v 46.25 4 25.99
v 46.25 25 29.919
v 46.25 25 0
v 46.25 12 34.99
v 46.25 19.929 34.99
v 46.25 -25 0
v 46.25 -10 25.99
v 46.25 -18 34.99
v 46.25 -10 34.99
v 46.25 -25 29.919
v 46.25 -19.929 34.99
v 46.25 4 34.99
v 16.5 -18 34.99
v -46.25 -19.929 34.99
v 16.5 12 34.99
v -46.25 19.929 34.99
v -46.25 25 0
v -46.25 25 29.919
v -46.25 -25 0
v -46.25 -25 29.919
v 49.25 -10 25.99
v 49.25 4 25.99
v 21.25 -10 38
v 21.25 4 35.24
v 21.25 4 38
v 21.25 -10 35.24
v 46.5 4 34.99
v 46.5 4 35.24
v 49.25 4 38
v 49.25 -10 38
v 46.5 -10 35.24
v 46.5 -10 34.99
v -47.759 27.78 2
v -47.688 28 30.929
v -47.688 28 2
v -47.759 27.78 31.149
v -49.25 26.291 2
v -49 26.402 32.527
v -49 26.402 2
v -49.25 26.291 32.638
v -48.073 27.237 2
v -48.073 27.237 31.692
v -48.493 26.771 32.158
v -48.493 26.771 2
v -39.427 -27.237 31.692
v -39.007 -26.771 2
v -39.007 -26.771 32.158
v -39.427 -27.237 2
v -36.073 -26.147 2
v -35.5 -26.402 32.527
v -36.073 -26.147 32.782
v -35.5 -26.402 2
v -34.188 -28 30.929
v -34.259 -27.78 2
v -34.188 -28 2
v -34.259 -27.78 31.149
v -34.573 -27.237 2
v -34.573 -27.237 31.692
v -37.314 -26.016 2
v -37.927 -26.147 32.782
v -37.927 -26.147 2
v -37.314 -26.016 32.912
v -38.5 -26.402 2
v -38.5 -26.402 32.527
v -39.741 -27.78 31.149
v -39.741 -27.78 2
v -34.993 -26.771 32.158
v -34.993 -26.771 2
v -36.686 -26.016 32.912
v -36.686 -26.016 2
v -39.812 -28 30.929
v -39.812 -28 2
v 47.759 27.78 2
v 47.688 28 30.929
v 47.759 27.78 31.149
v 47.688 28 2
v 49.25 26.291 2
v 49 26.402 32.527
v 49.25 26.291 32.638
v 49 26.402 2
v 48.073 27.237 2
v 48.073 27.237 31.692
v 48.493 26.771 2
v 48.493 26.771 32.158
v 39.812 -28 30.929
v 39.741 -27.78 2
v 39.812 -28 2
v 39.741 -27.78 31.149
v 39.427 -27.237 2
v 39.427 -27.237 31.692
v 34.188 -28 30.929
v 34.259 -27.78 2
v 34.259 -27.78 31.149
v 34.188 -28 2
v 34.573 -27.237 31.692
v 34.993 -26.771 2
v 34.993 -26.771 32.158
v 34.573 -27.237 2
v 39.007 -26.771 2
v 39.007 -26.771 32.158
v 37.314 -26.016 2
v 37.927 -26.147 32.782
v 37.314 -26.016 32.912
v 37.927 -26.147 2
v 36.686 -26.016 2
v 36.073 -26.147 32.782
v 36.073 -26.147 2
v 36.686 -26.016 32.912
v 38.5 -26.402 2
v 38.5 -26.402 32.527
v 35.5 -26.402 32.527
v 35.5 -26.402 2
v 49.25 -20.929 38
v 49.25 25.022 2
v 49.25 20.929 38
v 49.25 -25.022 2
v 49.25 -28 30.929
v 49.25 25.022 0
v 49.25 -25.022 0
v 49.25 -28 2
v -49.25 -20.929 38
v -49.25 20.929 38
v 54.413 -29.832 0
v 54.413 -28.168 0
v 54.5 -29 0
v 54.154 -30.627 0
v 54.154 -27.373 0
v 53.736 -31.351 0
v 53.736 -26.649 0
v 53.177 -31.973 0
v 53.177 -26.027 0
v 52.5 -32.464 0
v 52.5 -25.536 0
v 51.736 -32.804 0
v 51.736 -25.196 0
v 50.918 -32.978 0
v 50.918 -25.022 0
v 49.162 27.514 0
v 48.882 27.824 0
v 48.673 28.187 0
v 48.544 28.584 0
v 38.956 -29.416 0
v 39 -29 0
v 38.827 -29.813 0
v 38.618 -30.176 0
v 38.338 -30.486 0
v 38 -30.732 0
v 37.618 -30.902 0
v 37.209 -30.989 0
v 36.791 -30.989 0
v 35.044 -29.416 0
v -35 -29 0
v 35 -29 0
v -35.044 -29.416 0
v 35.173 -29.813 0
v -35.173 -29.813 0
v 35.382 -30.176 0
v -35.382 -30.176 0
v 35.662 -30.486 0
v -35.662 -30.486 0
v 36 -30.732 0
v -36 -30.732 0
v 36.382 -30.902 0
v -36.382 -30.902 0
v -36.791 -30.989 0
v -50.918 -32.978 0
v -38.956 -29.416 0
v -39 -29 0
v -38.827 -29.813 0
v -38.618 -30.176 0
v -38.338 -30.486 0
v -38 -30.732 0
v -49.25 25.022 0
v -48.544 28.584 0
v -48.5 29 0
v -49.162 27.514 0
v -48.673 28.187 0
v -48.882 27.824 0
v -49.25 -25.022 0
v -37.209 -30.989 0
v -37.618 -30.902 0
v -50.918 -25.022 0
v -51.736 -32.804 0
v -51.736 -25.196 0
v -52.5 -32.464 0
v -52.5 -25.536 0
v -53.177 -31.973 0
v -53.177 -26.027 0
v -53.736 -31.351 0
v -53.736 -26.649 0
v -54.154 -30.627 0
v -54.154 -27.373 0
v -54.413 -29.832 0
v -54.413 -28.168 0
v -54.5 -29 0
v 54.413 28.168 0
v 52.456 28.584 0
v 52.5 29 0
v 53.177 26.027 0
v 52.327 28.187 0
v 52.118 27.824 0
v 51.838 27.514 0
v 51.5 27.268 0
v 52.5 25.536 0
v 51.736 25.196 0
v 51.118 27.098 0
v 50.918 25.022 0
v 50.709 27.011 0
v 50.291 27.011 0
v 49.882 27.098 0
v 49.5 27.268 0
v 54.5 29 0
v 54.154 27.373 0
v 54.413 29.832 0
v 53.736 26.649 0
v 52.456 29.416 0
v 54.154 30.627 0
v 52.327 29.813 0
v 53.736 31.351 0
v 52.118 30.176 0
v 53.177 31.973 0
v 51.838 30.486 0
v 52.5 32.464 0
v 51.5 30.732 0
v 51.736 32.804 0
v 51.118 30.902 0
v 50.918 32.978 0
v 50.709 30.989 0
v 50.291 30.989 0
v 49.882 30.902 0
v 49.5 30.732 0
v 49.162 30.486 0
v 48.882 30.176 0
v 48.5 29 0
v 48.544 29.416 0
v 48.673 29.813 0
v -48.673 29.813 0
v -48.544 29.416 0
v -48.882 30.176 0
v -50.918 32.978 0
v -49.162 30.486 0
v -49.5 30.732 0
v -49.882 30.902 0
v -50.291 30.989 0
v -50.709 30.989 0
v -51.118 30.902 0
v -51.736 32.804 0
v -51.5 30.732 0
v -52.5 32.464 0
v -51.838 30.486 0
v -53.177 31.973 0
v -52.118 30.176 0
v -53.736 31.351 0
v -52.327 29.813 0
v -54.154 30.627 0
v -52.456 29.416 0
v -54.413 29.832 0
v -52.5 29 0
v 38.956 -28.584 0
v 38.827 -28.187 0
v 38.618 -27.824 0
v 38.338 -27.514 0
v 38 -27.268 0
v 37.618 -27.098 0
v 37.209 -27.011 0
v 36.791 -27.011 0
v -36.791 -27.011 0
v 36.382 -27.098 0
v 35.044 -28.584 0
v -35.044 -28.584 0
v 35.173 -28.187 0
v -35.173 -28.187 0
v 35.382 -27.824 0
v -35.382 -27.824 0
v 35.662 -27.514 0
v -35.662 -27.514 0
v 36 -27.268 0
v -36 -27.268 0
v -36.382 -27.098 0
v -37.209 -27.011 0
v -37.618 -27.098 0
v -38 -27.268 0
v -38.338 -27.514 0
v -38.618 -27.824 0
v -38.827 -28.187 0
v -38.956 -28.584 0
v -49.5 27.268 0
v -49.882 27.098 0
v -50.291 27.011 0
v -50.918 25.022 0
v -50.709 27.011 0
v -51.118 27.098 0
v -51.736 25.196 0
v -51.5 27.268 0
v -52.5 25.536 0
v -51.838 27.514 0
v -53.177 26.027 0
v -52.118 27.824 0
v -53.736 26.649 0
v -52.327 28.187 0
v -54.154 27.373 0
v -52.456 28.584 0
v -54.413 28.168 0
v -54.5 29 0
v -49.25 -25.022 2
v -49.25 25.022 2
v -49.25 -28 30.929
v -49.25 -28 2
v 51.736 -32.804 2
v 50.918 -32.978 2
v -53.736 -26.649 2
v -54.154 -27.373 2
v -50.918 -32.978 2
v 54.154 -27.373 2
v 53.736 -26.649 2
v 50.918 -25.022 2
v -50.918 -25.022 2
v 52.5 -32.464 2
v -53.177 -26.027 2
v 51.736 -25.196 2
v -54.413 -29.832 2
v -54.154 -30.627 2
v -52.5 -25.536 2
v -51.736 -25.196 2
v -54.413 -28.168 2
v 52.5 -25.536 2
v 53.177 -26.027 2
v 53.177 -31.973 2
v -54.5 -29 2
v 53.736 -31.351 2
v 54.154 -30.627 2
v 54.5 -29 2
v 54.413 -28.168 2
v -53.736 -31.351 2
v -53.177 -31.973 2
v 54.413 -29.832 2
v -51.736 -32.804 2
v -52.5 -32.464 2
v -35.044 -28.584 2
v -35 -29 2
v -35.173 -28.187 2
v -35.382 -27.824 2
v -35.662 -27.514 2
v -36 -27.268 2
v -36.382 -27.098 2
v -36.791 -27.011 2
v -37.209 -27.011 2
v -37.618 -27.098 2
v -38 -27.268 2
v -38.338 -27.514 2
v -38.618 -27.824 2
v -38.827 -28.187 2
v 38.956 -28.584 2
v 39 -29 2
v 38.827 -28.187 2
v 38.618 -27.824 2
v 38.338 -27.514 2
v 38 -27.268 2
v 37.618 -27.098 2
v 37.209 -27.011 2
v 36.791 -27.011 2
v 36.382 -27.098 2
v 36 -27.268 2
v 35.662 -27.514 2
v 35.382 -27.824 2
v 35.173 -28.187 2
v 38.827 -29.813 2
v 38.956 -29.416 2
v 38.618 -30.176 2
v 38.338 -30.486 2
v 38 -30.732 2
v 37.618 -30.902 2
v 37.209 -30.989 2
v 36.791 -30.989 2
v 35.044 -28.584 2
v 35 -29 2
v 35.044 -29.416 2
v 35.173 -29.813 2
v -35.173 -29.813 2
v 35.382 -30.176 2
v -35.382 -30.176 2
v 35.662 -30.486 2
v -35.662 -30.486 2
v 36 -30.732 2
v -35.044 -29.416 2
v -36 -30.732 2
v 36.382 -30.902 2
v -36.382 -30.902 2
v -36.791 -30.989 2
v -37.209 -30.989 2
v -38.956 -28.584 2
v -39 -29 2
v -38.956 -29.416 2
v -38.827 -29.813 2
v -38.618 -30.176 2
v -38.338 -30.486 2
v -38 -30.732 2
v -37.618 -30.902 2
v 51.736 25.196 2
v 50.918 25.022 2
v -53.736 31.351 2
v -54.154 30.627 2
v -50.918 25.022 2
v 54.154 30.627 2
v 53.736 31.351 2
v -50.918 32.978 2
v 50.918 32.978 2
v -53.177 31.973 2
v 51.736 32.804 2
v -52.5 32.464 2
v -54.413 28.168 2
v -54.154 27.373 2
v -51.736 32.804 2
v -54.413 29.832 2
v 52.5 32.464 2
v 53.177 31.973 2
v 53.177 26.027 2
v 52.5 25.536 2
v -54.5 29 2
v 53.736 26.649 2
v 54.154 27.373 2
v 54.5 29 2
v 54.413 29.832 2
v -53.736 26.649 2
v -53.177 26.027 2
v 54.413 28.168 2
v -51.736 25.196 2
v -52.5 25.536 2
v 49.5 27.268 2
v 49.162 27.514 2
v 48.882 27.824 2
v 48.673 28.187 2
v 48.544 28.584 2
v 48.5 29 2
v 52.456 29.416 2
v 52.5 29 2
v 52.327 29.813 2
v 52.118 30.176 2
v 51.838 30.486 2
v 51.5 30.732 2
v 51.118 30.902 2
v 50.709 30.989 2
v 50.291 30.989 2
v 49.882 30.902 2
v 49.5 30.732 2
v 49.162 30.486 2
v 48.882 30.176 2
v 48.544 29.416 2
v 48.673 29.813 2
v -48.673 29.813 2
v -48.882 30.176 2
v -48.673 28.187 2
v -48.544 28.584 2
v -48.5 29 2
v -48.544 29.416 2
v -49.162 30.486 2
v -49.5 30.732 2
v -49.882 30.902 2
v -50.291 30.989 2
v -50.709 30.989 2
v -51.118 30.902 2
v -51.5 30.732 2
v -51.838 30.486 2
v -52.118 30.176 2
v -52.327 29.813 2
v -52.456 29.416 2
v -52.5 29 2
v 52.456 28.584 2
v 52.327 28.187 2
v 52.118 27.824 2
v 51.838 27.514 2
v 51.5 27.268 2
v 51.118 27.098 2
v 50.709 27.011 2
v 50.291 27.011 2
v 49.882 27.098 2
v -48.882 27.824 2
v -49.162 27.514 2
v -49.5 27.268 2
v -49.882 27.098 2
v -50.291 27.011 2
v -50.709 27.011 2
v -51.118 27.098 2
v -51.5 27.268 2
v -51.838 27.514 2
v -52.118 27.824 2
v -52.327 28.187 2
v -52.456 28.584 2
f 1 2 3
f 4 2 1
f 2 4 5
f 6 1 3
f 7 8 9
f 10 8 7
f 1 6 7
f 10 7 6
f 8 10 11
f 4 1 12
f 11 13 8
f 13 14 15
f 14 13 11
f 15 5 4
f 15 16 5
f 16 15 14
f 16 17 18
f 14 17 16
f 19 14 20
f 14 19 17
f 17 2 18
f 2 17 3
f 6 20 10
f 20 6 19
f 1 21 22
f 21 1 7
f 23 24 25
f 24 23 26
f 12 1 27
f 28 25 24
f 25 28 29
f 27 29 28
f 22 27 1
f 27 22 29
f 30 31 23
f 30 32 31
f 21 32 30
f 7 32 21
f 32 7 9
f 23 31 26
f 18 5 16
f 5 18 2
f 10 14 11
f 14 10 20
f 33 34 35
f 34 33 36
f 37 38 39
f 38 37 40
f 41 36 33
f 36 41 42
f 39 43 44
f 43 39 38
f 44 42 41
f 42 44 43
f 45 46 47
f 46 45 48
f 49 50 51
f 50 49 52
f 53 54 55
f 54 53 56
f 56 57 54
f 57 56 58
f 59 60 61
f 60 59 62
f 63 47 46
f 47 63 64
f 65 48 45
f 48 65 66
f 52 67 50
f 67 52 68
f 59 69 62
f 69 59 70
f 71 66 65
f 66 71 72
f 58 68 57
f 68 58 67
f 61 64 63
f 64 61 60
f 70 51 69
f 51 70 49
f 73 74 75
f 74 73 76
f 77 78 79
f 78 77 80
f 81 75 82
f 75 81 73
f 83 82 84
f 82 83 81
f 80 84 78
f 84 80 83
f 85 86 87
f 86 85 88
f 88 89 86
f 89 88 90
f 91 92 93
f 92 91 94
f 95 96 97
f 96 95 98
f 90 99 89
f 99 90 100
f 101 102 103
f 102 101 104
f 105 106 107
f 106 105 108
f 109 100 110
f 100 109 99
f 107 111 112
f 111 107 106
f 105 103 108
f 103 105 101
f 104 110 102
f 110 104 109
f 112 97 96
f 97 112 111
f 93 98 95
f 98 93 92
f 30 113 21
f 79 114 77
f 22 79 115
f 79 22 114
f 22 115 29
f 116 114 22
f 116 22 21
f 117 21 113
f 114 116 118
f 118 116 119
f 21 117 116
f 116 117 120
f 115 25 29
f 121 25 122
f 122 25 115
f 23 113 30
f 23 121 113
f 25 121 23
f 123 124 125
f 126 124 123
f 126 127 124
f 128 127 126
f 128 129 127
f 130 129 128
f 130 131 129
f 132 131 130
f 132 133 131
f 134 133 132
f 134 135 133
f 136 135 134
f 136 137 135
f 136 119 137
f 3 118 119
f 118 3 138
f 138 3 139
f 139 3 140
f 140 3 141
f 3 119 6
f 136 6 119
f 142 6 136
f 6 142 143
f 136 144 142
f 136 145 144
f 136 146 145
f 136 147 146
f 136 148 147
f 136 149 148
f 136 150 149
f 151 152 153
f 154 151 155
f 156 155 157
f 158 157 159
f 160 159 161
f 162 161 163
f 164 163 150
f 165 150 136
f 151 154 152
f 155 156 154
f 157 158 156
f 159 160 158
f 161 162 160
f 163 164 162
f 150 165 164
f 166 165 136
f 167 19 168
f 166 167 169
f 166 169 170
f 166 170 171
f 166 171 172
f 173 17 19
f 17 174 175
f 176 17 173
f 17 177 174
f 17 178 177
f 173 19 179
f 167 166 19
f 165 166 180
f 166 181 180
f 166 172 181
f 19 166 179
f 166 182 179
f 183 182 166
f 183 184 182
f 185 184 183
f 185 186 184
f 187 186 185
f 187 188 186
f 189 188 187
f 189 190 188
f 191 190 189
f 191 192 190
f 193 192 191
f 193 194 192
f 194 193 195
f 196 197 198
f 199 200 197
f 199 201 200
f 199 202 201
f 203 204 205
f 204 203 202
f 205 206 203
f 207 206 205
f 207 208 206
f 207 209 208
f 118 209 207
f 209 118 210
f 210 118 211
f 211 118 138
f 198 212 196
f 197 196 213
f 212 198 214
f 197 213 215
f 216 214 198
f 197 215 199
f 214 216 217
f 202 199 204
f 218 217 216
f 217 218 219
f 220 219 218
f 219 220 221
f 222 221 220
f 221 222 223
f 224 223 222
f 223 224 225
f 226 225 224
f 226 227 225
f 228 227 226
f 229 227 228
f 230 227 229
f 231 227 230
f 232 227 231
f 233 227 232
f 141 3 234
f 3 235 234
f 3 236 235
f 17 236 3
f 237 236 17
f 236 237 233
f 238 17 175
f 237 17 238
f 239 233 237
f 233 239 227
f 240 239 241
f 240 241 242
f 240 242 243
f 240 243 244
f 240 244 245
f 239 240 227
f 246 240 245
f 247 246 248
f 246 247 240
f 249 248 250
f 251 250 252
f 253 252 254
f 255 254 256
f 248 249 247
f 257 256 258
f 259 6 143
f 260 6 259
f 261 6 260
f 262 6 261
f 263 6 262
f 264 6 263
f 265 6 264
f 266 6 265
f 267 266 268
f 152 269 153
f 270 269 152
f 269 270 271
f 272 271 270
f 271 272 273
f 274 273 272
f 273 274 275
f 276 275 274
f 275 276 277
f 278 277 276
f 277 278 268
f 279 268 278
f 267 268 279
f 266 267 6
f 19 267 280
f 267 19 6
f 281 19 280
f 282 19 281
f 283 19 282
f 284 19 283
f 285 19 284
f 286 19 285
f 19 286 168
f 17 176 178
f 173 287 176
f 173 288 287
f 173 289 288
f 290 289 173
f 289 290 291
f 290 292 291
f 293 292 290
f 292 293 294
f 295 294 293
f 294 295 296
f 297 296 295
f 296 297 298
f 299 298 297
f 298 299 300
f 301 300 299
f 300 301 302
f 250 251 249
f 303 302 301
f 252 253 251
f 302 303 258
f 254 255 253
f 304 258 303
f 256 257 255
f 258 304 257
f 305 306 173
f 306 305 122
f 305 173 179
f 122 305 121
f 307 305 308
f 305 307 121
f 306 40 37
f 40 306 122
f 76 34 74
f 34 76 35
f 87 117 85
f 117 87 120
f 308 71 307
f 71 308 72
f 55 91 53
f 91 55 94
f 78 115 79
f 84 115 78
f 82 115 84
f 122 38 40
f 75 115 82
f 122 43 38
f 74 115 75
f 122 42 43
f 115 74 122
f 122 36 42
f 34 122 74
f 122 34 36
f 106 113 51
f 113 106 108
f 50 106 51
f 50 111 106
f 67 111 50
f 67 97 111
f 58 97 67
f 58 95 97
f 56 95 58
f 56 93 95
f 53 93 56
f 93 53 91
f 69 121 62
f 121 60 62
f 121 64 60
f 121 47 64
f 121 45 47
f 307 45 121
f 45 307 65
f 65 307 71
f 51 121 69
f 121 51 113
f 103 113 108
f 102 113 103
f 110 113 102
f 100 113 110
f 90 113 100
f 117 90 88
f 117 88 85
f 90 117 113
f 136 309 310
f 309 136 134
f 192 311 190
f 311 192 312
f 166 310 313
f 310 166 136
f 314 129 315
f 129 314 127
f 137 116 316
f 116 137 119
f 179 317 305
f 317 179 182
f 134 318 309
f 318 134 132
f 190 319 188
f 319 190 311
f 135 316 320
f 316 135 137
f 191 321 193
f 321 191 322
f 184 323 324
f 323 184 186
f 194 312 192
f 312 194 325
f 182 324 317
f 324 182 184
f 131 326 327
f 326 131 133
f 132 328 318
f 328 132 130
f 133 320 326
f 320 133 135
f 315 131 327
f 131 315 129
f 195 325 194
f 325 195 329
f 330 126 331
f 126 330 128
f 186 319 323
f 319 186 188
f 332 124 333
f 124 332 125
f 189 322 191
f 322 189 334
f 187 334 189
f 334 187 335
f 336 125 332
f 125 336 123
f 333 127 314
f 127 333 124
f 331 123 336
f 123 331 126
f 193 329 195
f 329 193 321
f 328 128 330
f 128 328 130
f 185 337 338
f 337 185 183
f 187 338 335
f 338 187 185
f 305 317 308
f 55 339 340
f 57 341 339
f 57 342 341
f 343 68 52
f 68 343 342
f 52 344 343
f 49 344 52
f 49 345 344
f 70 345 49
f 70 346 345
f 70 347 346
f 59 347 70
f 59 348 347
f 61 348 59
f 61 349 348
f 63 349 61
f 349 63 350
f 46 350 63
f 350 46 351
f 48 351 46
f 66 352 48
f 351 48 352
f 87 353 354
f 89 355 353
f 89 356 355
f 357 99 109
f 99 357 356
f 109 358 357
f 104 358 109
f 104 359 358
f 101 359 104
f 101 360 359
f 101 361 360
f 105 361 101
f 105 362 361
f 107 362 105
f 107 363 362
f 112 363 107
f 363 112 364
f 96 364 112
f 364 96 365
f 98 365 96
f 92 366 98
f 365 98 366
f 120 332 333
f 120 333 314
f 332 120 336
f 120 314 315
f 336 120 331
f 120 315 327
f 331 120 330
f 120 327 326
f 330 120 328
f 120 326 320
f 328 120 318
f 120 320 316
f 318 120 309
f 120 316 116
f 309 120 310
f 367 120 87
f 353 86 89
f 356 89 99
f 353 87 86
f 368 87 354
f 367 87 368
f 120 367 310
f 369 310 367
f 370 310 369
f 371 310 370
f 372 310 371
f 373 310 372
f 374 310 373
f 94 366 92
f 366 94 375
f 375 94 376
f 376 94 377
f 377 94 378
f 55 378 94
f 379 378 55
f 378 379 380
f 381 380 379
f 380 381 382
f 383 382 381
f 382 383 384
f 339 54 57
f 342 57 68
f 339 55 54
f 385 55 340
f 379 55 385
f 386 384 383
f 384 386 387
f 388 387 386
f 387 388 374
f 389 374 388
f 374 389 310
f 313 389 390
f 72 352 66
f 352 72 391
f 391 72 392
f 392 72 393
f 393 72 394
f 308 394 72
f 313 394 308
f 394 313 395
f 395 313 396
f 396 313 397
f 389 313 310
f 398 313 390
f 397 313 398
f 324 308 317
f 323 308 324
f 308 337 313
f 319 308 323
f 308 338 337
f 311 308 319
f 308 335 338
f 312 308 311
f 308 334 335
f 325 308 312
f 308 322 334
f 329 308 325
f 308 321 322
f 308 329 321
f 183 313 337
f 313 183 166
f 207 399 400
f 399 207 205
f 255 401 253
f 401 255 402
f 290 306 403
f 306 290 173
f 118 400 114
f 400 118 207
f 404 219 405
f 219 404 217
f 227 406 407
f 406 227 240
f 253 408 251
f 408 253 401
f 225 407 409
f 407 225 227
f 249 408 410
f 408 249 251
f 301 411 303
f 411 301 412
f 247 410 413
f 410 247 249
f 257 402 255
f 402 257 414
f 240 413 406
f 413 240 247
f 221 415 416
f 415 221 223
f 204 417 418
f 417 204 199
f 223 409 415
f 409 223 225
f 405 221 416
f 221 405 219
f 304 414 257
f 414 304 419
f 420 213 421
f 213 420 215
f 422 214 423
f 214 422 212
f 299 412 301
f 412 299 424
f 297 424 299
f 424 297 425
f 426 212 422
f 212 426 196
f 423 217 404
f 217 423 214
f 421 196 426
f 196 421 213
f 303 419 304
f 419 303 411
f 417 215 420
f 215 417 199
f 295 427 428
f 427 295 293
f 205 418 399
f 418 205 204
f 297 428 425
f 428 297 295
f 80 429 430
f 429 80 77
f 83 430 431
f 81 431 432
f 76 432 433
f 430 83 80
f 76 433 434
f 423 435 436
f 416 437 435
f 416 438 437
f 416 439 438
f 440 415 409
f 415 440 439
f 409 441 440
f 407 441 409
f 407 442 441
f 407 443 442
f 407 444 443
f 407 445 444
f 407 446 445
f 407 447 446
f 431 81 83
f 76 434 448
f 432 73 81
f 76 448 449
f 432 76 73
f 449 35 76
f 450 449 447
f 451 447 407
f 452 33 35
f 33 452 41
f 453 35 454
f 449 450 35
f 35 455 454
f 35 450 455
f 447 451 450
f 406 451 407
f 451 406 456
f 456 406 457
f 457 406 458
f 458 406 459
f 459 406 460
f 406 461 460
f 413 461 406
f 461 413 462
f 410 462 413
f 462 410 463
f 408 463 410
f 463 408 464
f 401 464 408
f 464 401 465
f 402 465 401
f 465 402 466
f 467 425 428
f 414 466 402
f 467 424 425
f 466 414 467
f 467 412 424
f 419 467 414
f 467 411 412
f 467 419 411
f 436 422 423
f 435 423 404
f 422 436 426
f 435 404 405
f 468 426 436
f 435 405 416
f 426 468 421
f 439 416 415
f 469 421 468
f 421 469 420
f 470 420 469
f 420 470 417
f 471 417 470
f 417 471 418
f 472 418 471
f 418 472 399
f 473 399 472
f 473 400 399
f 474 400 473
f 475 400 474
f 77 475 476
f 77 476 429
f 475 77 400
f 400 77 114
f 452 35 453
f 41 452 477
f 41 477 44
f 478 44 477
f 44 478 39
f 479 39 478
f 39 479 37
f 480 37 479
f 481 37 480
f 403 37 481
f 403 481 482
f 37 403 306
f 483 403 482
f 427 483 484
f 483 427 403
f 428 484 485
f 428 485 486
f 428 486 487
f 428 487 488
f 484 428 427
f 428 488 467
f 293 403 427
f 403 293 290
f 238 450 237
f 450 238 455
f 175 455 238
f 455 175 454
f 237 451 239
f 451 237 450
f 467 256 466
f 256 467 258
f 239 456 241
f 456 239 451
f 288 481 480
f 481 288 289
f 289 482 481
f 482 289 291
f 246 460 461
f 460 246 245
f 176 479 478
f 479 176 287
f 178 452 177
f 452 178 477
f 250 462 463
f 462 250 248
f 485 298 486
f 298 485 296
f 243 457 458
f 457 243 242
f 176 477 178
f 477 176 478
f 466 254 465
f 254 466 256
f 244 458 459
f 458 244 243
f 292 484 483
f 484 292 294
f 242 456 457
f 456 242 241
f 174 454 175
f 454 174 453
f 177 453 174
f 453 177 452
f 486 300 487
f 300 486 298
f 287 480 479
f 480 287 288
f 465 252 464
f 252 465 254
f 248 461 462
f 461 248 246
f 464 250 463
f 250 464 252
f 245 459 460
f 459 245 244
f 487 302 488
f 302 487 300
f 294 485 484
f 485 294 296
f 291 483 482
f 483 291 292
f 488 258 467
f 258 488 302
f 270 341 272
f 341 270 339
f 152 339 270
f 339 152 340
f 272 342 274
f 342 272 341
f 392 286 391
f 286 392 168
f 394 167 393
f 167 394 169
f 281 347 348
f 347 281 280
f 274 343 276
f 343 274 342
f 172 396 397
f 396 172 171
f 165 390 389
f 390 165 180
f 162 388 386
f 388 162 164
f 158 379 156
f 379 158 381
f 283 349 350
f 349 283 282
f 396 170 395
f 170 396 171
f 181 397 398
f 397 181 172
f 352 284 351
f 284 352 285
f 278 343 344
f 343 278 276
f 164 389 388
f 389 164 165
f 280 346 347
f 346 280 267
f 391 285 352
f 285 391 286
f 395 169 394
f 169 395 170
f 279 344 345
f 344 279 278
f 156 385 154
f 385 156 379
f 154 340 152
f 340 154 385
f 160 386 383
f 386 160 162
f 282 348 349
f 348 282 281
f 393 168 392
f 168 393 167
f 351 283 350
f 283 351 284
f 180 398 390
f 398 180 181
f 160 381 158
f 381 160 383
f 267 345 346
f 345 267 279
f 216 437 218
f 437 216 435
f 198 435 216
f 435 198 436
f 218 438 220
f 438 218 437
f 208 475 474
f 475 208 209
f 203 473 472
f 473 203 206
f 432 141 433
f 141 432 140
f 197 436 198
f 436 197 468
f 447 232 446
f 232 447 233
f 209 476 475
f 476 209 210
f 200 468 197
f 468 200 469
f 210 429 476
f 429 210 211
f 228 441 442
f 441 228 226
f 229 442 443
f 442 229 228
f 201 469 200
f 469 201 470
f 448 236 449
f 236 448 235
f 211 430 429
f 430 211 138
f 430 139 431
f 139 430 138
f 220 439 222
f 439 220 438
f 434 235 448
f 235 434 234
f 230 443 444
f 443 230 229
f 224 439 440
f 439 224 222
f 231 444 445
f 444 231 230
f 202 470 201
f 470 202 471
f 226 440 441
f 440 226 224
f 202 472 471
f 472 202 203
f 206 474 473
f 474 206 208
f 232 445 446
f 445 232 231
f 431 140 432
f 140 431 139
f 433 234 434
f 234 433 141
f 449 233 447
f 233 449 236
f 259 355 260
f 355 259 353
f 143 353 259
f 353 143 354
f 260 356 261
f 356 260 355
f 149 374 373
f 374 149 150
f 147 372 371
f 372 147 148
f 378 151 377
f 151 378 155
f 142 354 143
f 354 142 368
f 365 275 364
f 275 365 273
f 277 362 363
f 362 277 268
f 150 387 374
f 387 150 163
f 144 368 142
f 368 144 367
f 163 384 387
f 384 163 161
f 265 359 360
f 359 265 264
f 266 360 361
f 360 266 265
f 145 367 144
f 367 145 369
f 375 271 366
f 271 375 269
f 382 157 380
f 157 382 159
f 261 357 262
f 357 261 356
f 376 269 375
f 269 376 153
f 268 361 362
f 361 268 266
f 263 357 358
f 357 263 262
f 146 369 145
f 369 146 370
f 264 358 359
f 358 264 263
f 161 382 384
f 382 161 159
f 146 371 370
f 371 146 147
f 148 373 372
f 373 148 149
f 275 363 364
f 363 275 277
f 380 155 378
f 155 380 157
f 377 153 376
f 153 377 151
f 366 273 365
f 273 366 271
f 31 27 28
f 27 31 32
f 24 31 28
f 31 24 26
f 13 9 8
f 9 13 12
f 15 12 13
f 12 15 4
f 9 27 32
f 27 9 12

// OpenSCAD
$fn = 30;

bx = 6.18;
by = 6.18;
bz = 3.5;
bgap = 3.75;
btab = 1.2; // height of button above body
wall = 4;
bezel = 3;
flangez = 1;
bheight = 2;
grid = 2.54;
pcbthk = 1.6;

braceheight = 5; // calculated to 4.7, but needs verification

rowx = bx+bgap+wall*2+4;
rowy = 4*(by+bgap)+2*grid+4;
row3y = 3*(by+bgap)+4;
echo(rowx);
echo(rowy);

*button_housing();
*row();
*for (i=[-1, 1, 0], j=[-1, 1])
    translate([i*15, j*10, 0])
        button_pad();
*xypad(); 

*xyback();
*zpad();
*row3();
*zpad2();
*zpad3();
*z3back();

*z2back();
*resetpad();

*xbutton_pad();
*translate([0, -10, 0]) ybutton_pad();
*translate([0, -20, 0]) zbutton_pad();

*resetback();

*translate([-13, 18, -40])
fullback();
*resettunnel();
*translate([-70, 0, 0])ztunnel();
*backbox();
*lid();
*backplate();
backbox2();

module backbox2() {
    union() {
        translate([0, 0, 38/2])
        difference() {
            union() {
                cube([98.5, 56, 38], true);
            }
            translate([0, 56/2, 38/2])
                rotate([45, 0, 0])
                    cube([200, 10, 40], true);
             translate([0, -56/2, 38/2])
                rotate([-45, 0, 0])
                    cube([200, 10, 40], true);
            
            translate([0, 0, -1.51])
                backboxvoid();
            
            for (i=[-1, 1]) {
                translate([i*101/2, 29, 0])
                    cylinder(r=3, h=200, center=true);
                translate([i*37, -29, 0])
                    cylinder(r=3, h=200, center=true);
            }

            
         }
         mounttabs();
         translate([31.5, -3, 35.115])
            color("red") cube([30, 30, 0.25], true);
     }
}

module mounttabs() {
    translate([0, 0, 1])
    difference() {
        for(i=[-1, 1]) {
            translate([0, i*58/2, 0])
                hull() {
                    for (j=[-1, 1])
                        translate([j*101/2, 0, 0])
                            cylinder(r=4, h=2, center=true);
                }
        }
        for (i=[-1, 1]) {
            translate([i*101/2, 29, 0])
                cylinder(r=2, h=20, center=true);
            translate([i*37, -29, 0])
                cylinder(r=2, h=20, center=true);
        }
    }
}

module backboxvoid() {
    difference() {
        union() {
            cube([92.5, 50, 35], true);
            translate([92.5/2-26/2+3, -50/2+14/2+15, 35/2-10/2+3])
                cube([30, 14, 14], true);
        }
        translate([0, 50/2+1, 35/2+1])
            rotate([45, 0, 0])
                cube([200, 10, 40], true);
         translate([0, -50/2-1, 35/2+1])
            rotate([-45, 0, 0])
                cube([200, 10, 40], true);
    }
}

module lid() {
    mirror([0, 0, 0])
     union() {
        difference() {
            union() {
                hull() for(i=[-1, 1], j=[-1, 1])
                    translate([i*(93/2+4), j*(50/2+4), 0])
                        cylinder(r=4, h=8, center=true);
               translate([-13, 18, 0])
                    cylinder(r=30, h=8, center=true);
            }
            translate([0, 0, 2])
                cube([93, 50, 8], true);
            translate([-13, 18, 2]) 
                cylinder(r=27, h=8, center=true);
            
   
            translate([93/2, -(50/2+4)-4+2.5+37, 8/2-4/2])
                cube([20, 5, 4.01], true);
             
             
            for(i=[-1, 1], j=[-1, 1])
                translate([i*(93/2+4), j*(50/2+4), 0])
                    cylinder(r=2, h=10, center=true);

         }
     }
}

module backplate() {
    mirror([0, 1, 0])
     union() {
        difference() {
            union() {
                hull() for(i=[-1, 1], j=[-1, 1])
                    translate([i*(93/2+4), j*(50/2+4), 0])
                        cylinder(r=4, h=5, center=true);
                translate([46, 0, 0])
                    hull() for (i=[-1, 1])
                        translate([0, i*15-30, 0])
                            cylinder(r=8, h=5, center=true);
                translate([-50, -20, 0])
                    cylinder(r=15, h=5, center=true);
                translate([-13, 18, 0])
                    cylinder(r=30, h=5, center=true);
            }
            translate([0, 0, 2])
                cube([93, 50, 5], true);
            translate([46, 0, 0])
                hull() for (i=[-1, 1])
                    translate([0, i*15-30, -1.9])
                        cylinder(r=6, h=5, center=true);
            translate([-50, -20, -1.9])
                cylinder(r=13, h=5, center=true);
            translate([-13, 18, 2]) {
                cylinder(r=8, h=50, center=true);
                for(i=[-1, 1], j=[-1, 1])
                    translate([i*15, j*15, 0]) {
                        cylinder(r=1.9, h=50, center=true);
                    }
                for(i=[-1, 1])
                    translate([i*15, 15, 0]) {
                        cylinder(r=3.4, h=5, center=true);
                    }
            }
             
             
             
            for(i=[-1, 1])
                translate([i*(93/2+4), (50/2+4), 0]) {
                   translate([0, 0, 3.25])
                        cylinder(r=1.9, h=5, center=true);
                   translate([0, 0, -2])
                        cylinder(r=3.2, h=5, center=true, $fn=6);
                }
                
            for(i=[-1, 1])
                translate([i*(60/2+4), -(50/2+4), 0]) {
                   translate([0, 0, 3.25])
                        cylinder(r=1.9, h=5, center=true);
                   translate([0, 0, -2])
                        cylinder(r=3.2, h=5, center=true, $fn=6);
                }

         }
         translate([41.5, 14.75, 1.5])
            difference() {
                cylinder(r=4, h=8, center=true);
                cylinder(r=2.6, h=11, center=true);
            }
         translate([-37.5, -14., 1.5])
            difference() {
                cylinder(r=4, h=8, center=true);
                translate([0, 0, 2])
                    cylinder(r=2.6, h=10, center=true);
            }
     }
}

module backbox() {
    mirror([0, 1, 0])
     union() {
        difference() {
            union() {
                hull() for(i=[-1, 1], j=[-1, 1])
                    translate([i*(93/2+4), j*(50/2+4), 0])
                        cylinder(r=4, h=40, center=true);
                translate([46, 0, 0])
                    hull() for (i=[-1, 1])
                        translate([0, i*15-30, -40/2+10/2])
                            cylinder(r=8, h=10, center=true);
                translate([-50, -20, -40/2+10/2])
                    cylinder(r=15, h=10, center=true);
                translate([-13, 18, 0])
                    cylinder(r=30, h=40, center=true);
            }
            translate([0, 0, 2])
                cube([93, 50, 40], true);
            translate([46, 0, 0])
                hull() for (i=[-1, 1])
                    translate([0, i*15-30, -40/2+10/2-2])
                        cylinder(r=6, h=10, center=true);
            translate([-50, -20, -40/2+10/2-2])
                cylinder(r=13, h=10, center=true);
            translate([-13, 18, 2]) {
                cylinder(r=27, h=40, center=true);
                cylinder(r=8, h=50, center=true);
                for(i=[-1, 1], j=[-1, 1])
                    translate([i*15, j*15, 0]) {
                        cylinder(r=1.9, h=50, center=true);
                    }
            }
             
             
             
            for(i=[-1, 1], j=[-1, 1])
                translate([i*(93/2+4), j*(50/2+4), 40/2-5+0.01])
                    cylinder(r=2.6, h=10, center=true);

         }
         translate([41.5, 14.75, -40/2+10/2])
            difference() {
                cylinder(r=4, h=10, center=true);
                cylinder(r=2.6, h=11, center=true);
            }
         translate([-37.5, -14., -40/2+10/2])
            difference() {
                cylinder(r=4, h=10, center=true);
                translate([0, 0, 2])
                    cylinder(r=2.6, h=10, center=true);
            }
     }
}

module resettunnel() {
    translate([-38, -38, 0]) {
        difference() {
            union() {
                translate([0, 0, -4])
                    cylinder(r=14, h=2, center=true);
                cylinder(r=8, h=10, center=true);
                translate([0, 15, 0])
                    cube([16, 30, 10], true);
            }
            translate([0, 0, -1])
                cylinder(r=5, h=8.01, center=true);
            translate([0, 15, -1])
                cube([10.02, 30.01, 8.01], true);
            rotate([0, 0, -17.7]) {
                translate([0, -10, 0]) {
                    translate([0, 0, 2])
                        cylinder(r=3, center=true, h=10);
                    cylinder(r=2, center=true, h=30);
                }
            }
        }
    }

}

module ztunnel() {
    translate([58.5, -45-17, 0]) {
        difference() {
            union() {
                cylinder(r=8, h=10, center=true);
                translate([0, 27, 0])
                    cube([16, 54, 10], true);
            }
            translate([0, 33, -1])
                cube([10, 54.01, 8.01], true);
            cylinder(r=2, h=20, center=true);
            translate([0, 0, 6])
                cylinder(r=4, h=10, center=true);
        }
    }

}

module fullback() {
    union() {
        xyback();
        translate([-38, -38, 0])
            resetback();
        translate([-41, -20, 1.5])
            rotate([0, 0, 72.3])
                cube([10, 50, 3], true);
        translate([-20, -40, 1.5])
            rotate([0, 0, 17.7])
                cube([10, 50, 3], true);
        translate([58.5, -45, 0])
            z3back();
        translate([52, -20, 1.5])
           rotate([0, 0, -72.3])
            cube([10, 35, 3], true);
    }
}

module body() {
    difference() {
       linear_extrude(height = 15) scale([1.1, 1.1, 1])
            import (file = "xypad.dxf");
       translate([0, 0, bezel])
            linear_extrude(height = 15-bezel) scale([0.9, 0.9, 1])
            import (file = "xypad.dxf");
    }
}

module xyback() {
    difference() {
        union() {
            linear_extrude(height = 5) scale([1.1, 1.1, 1])
                import (file = "xypad.dxf");
            for(i=[0, 1, 2, 3])
                rotate([0, 0, i*90])
                    translate([0, (rowx+rowy)/2, braceheight/2+5])
                        for(j=[-1, 1])
                            translate([j*(bx+bgap+wall)/2, 0, 0])
                                cube([wall-1, rowy, braceheight], true);
        }
        cylinder(r=8, h=12, center=true);
        
        for(i=[-1, 1], j=[-1, 1])
            translate([i*15, j*15, 0]) {
                cylinder(r=1.9, h=10, center=true);
                translate([0, 0, 2])
                    cylinder(r=3.2, h=4, $fn=6);
            }
            
        for(i=[-1, 1]) {
            translate([i*(rowy+rowx), 0, 0])
                cylinder(r=2, h=15, center=true);
            translate([0, i*(rowy+rowx), 0])
                cylinder(r=2, h=15, center=true);
        }

    }
}
    
module xypad() {
    union() {
        difference() {
            body();
            for(i=[0, 1, 2, 3])
                rotate([0, 0, i*90])
                    translate([0, rowy/2+bx+bgap, 0])
                        cube([rowx, rowy, bezel*3], true);;
            for(i=[-1, 1]) {
                translate([i*(rowy+rowx), 0, bezel])
                    cylinder(r=2.6, h=15);
                translate([0, i*(rowy+rowx), bezel])
                    cylinder(r=2.6, h=15);
            }
       }
        for(i=[0, 1, 2, 3])
            rotate([0, 0, i*90])
                translate([0, bx+bgap, 0])
                    row();
    }
    
}

module zpad() {
    union() {
        difference() {
            hull() {
                for (i=[-1, 1])
                    translate([0, i*(row3y-rowx+rowx/2+20)/2, 0])
                        cylinder(r=rowx/2+2, h=15);
            }
            translate([0, 0, 15/2+bezel])
                cube([rowx-4, row3y, 15], true);
            translate([0, 0, 0])
                cube([bx+bgap, row3y, 15], true);
            for (i=[-1, 1]) {
                translate([0, i*(row3y-rowx+rowx/2+20)/2, bezel])
                    cylinder(r=2.6, h=20);
           }
         }
        row3();
    }
}

module zpad2() {
    union() {
        difference() {
            hull() {
                for (i=[-1, 1])
                    translate([0, i*(row3y*2-rowx+rowx/2+24)/2, 0])
                        cylinder(r=rowx/2+2, h=15);
            }
            for (i=[-1, 1]) {
                translate([0, i*(row3y/2+2), 15/2+bezel])
                    cube([rowx-4, row3y, 15], true);
                translate([0, i*(row3y/2+2), 0])
                    cube([bx+bgap, row3y, 15], true);
            }
            for (i=[-1, 1]) {
                translate([0, i*(row3y*2-rowx+rowx/2+24)/2, bezel])
                    cylinder(r=2.6, h=20);
           }
         }
         for (i=[-1, 1])
             translate([0, i*(row3y/2+2), 0])
                 if (i == -1) {
                     rotate([0, 0, 180])
                        row3();
                 }
                 else {
                     row3();
                 }
    }
}

module zpad3() {
    mirror([1, 0,0])
    union() {
        //translate([0, 30, 0]) rotate([0, 0, 17.7]) cube([100, 4, 4], true);
        difference() {
            hull() {
                for (i=[-1, 1], j=[-1, 1])
                    translate([j*rowx, i*row3y/2+j*7, 0])
                        cylinder(r=10, h=15);
            }
            translate([0, 0, 5+bz+btab+bezel+flangez+pcbthk]) cube([30, row3y, 10], true);
            for (i=[-1, 1]) {
                translate([i*(rowx/2+2), i*4, 15/2+bezel])
                    cube([rowx-4, row3y, 15], true);
                translate([i*(rowx/2+2), i*4, 0])
                    cube([bx+bgap, row3y, 15], true);
            }
            translate([rowx, row3y/2+7, bezel])
                cylinder(r=2.6, h=20);
            translate([-rowx, -(row3y/2+7), bezel])
                cylinder(r=2.6, h=20);
    
         }
         for (i=[-1, 1])
             translate([i*(rowx/2+2), i*4, 0])
                 if (i == -1) {
                     rotate([0, 0, 180])
                        row3();
                 }
                 else {
                     row3();
                 }
    }
}

module z3back() {
    union() {
        //translate([0, 30, 0]) rotate([0, 0, 17.7]) cube([100, 4, 4], true);
        difference() {
            hull() {
                for (i=[-1, 1], j=[-1, 1])
                    translate([j*rowx, i*row3y/2+j*7, 0])
                        cylinder(r=10, h=3);
            }
            
            translate([rowx, row3y/2+7, bezel])
                cylinder(r=2, h=20, center=true);
            translate([-rowx, -(row3y/2+7), bezel])
                cylinder(r=2, h=20, center=true);
            
            hull() for (i=[-1, 1])
                translate([0, i*8, 0])
                    cylinder(r=4, h=20, center=true);
            
            translate([0, -17, 0]) {
                cylinder(r=2, h=20, center=true);
                translate([0, 0, 1.5])
                    cylinder(r=3.2, h=3, $fn=6);
            }
    
         }
         for (i=[-1, 1])
             translate([i*(rowx/2+2), i*4, braceheight/2+3])
                difference() {
                    cube([rowx-6, 15, braceheight], true);
                    cube([bx+bgap+1, 16, braceheight+1], true);
                }
   }
}

module z2back() {
    union() {
        difference() {
            hull() {
                for (i=[-1, 1])
                    translate([0, i*(row3y*2-rowx+rowx/2+24)/2, 0])
                        cylinder(r=rowx/2+2, h=3);
            }
            cylinder(r=5, h=10, center=true);
            for (i=[-1, 1]) {
                translate([0, i*(row3y*2-rowx+rowx/2+24)/2, 0])
                    cylinder(r=2, h=20, center=true);
                translate([0, i*10, 0]) {
                    cylinder(r=2, h=20, center=true);
                    translate([0, 0, 1.5])
                        cylinder(r=3.2, h=3, $fn=6);
                }
           }
         }
        for(i=[0, 1])
            rotate([0, 0, i*180])
                translate([0, (row3y/2+2), braceheight/2+3])
                    for(j=[-1, 1])
                        translate([j*(bx+bgap+wall)/2, 0, 0])
                            cube([wall-1, row3y-1, braceheight], true);
    }
}


module resetpad() {
    mirror()
    union() {
        difference() {
            union() {
                hull() {
                    cylinder(r=rowx/2+2, h=15);
                    rotate([0, 0, 72.3])
                        translate([0, 33, 0])
                            cylinder(r=rowx/2+2, h=15);
                }
                hull() {
                    cylinder(r=rowx/2+2, h=15);
                    rotate([0, 0, 17.7])
                        translate([0, -33, 0])
                            cylinder(r=rowx/2+2, h=15);
                }
            }
            
            cube([bx+bgap, by+bgap, 10], true);
            rotate([0, 0, 72.3])
                translate([0, 20, 0])
                    rotate([0, 0, -72.3])
                        cube([bx+bgap, by+bgap, 10], true);
            rotate([0, 0, 17.7])
                translate([0, -20, 0])
                    rotate([0, 0, -17.7])
                        cube([bx+bgap, by+bgap, 10], true);
            
            translate([0, 0, bezel]) union() {
                hull() {
                    cylinder(r=rowx/2+2-3, h=15);
                    rotate([0, 0, 72.3])
                        translate([0, 20, 0])
                            cylinder(r=rowx/2+2-3, h=15);
                }
                hull() {
                    cylinder(r=rowx/2+2-3, h=15);
                    rotate([0, 0, 17.7])
                        translate([0, -20, 0])
                            cylinder(r=rowx/2+2-3, h=15);
                }
            }
            rotate([0, 0, 72.3])
                translate([0, 33, bezel])
                cylinder(r=2.6, h=15);
            rotate([0, 0, 17.7])
                translate([0, -33, bezel])
                cylinder(r=2.6, h=15);

        }

        
        translate([0, -(by+bgap)/2, 0]) {
            buttony_housing();
            rotate([0, 0, 72.3])
                translate([0, 20, 0])
                    rotate([0, 0, -72.3])
                        buttonx_housing();
            rotate([0, 0, 17.7])
                translate([0, -20, 0])
                    rotate([0, 0, -17.7])
                        buttonz_housing();
        }
    }
}

module resetback() {
    union() {
        difference() {
            union() {
                hull() {
                    cylinder(r=rowx/2+2, h=3);
                    rotate([0, 0, 72.3])
                        translate([0, 33, 0])
                            cylinder(r=rowx/2+2, h=3);
                }
                hull() {
                    cylinder(r=rowx/2+2, h=3);
                    rotate([0, 0, 17.7])
                        translate([0, -33, 0])
                            cylinder(r=rowx/2+2, h=3);
                }
                rotate([0, 0, 72.3])
                    translate([0, 11, 3+braceheight/2])
                        difference() {
                            cube([19, 8, braceheight], true);
                            cube([8, 10, braceheight+1], true);
                        }
                rotate([0, 0, 17.1])
                    translate([0, -15, 3+braceheight/2])
                        difference() {
                            cube([19, 8, braceheight], true);
                            cube([8, 10, braceheight+1], true);
                        }
            }
        
            cylinder(r=5, h=10, center=true);
            rotate([0, 0, 72.3]) {
                translate([0, 10, 0]) {
                    cylinder(r=2, h=10, center=true);
                    translate([0, 0, 1.5])
                        cylinder(r=3.2, h=10, $fn=6);
                }
                translate([0, 33, 0])
                    cylinder(r=2, h=10, center=true);
            }
            rotate([0, 0, 17.7]) {
                translate([0, -10, 0]) {
                    cylinder(r=2, h=10, center=true);
                    translate([0, 0, 1.5])
                        cylinder(r=3.2, h=10, $fn=6);
                }
                translate([0, -33, 0])
                    cylinder(r=2, h=10, center=true);
            }
       }
    }
}

module row() {    
    translate([0, 2, 0])
    union() {
        for(i=[0, 1, 2])
            translate([0, i*(by+bgap), 0])
                button_housing();
        translate([0, 3*(by+bgap)+2*grid, 0])
            button_housing();
        translate([0, 3*(by+bgap)+grid, bezel/2])
            cube([bx+bgap+wall*2, 2*grid, bezel], true);
   
        for(i=[-1, 1]) {
            translate([i*((bx+bgap+wall*2)/2+1), (4*(by+bgap)+2*grid)/2, (bz+btab+bezel+flangez+pcbthk)/2])
                cube([2, 4*(by+bgap)+2*grid, bz+btab+bezel+flangez+pcbthk], true);
            translate([0, (i+1)*((4*(by+bgap)+2*grid)/2)+i, (bz+btab+bezel+flangez+pcbthk)/2])
                cube([bx+bgap+wall*2+4, 2, bz+btab+bezel+flangez+pcbthk], true);
        }
    }
}

module row3() {    
    union() {
        translate([0, -(by+bgap)/2, 0])
            for (i=[-1, 0, 1]) {
            translate([0, i*(by+bgap), 0])
                button_housing();
            }
   
        for(i=[-1, 1]) {
            translate([i*((bx+bgap+wall*2)/2+1), 0, (bz+btab+bezel+flangez+pcbthk)/2])
                cube([2, 3*(by+bgap), bz+btab+bezel+flangez+pcbthk], true);
            translate([0, i*((3*(by+bgap))/2+1), (bz+btab+bezel+flangez+pcbthk)/2])
                cube([bx+bgap+wall*2+4, 2, bz+btab+bezel+flangez+pcbthk], true);
        }
    }
}

module button_housing() {
    translate([0, (by+bgap)/2, (bz+btab+bezel+flangez)/2])
        difference() {
            cube([bx+bgap+wall*2, by+bgap, bz+btab+bezel+flangez], true);
            translate([0, 0, bezel/2])
                cube([bx+bgap, by+bgap+1, bz+btab+flangez+.001], true);
            translate([0, -1, 0])
                tri_prism(sc=1.55);
        }
}

module buttony_housing() {
    translate([0, (by+bgap)/2, (bz+btab+bezel+flangez)/2])
        difference() {
            cube([bx+bgap+wall*2, by+bgap, bz+btab+bezel+flangez], true);
            translate([0, 0, bezel/2])
                cube([bx+bgap, by+bgap+1, bz+btab+flangez+.001], true);
            translate([0, 0, 0])
                y_prism(sc=1.55);
        }
}

module buttonx_housing() {
    translate([0, (by+bgap)/2, (bz+btab+bezel+flangez)/2])
        difference() {
            cube([bx+bgap+wall*2, by+bgap, bz+btab+bezel+flangez], true);
            translate([0, 0, bezel/2])
                cube([bx+bgap, by+bgap+1, bz+btab+flangez+.001], true);
            translate([0, 0, 0])
                x_prism(sc=1.55);
        }
}

module buttonz_housing() {
    translate([0, (by+bgap)/2, (bz+btab+bezel+flangez)/2])
        difference() {
            cube([bx+bgap+wall*2, by+bgap, bz+btab+bezel+flangez], true);
            translate([0, 0, bezel/2])
                cube([bx+bgap, by+bgap+1, bz+btab+flangez+.001], true);
            translate([0, 0, 0])
                z_prism(sc=1.55);
        }
}

module button_pad() {
    union() {
        translate([0, 0, (bezel+bheight)/2+flangez])
            tri_prism(ht=bezel+bheight, sc=1.2);
        translate([0, 0, flangez/2])
            cube([bx+bgap-1.5, by+bgap-1.5, flangez], true);
    }
}

module xbutton_pad() {
    union() {
        translate([0, 0, (bezel+bheight)/2+flangez])
            x_prism(ht=bezel+bheight, sc=1.2);
        translate([0, 0, flangez/2])
            cube([bx+bgap-1.5, by+bgap-1.5, flangez], true);
    }
}

module ybutton_pad() {
    union() {
        translate([0, 1.5, (bezel+bheight)/2+flangez])
            y_prism(ht=bezel+bheight, sc=1.2);
        translate([0, 0, flangez/2])
            cube([bx+bgap-1.5, by+bgap-1.5, flangez], true);
    }
}

module zbutton_pad() {
    union() {
        translate([0, 0, (bezel+bheight)/2+flangez])
            z_prism(ht=bezel+bheight, sc=1.2);
        translate([0, 0, flangez/2])
            cube([bx+bgap-1.5, by+bgap-1.5, flangez], true);
    }
}


module tri_prism(ht=10, sc=1) {
    translate([0, 0, -ht/2])
        linear_extrude(height=ht)
            scale([sc, sc, 1])
            polygon(points=[ [0, 3.33], [-2.89, -1.67], [2.89, -1.67]]);
}

module y_prism(ht=10, sc=1) {
    translate([0, 0, -ht/2])
        linear_extrude(height=ht)
            scale([sc, sc, 1])
            polygon(points=[ [0, 0], [-0.65, 1.1], [-2.9, 1.1], [-1.125, -1.9], [-1.125, -3.9], [1.125, -3.9], [1.125, -1.9], [2.9, 1.1], [0.65, 1.1] ]);
}

module x_prism(ht=10, sc=1) {
    translate([0, 0, -ht/2])
        linear_extrude(height=ht)
            scale([sc, sc, 1])
            polygon(points=[ [-2.9, 2.5], [-1, 0], [-2.9, -2.5], [-0.9, -2.5], [0, -1.28], [0.9, -2.5], [2.9, -2.5], [1, 0], [2.9, 2.5], [0.9, 2.5], [0, 1.28], [-0.9, 2.5] ]);
}

module z_prism(ht=10, sc=1) {
    translate([0, 0, -ht/2])
        linear_extrude(height=ht)
            scale([sc, sc, 1])
            polygon(points=[ [-2.7, 2.5], [-2.7, 1], [0.16, 1], [-2.7, -1], [-2.7, -2.5], [2.7, -2.5], [2.7, -1], [-0.16, -1], [2.7, 1], [2.7, 2.5] ]);
}
